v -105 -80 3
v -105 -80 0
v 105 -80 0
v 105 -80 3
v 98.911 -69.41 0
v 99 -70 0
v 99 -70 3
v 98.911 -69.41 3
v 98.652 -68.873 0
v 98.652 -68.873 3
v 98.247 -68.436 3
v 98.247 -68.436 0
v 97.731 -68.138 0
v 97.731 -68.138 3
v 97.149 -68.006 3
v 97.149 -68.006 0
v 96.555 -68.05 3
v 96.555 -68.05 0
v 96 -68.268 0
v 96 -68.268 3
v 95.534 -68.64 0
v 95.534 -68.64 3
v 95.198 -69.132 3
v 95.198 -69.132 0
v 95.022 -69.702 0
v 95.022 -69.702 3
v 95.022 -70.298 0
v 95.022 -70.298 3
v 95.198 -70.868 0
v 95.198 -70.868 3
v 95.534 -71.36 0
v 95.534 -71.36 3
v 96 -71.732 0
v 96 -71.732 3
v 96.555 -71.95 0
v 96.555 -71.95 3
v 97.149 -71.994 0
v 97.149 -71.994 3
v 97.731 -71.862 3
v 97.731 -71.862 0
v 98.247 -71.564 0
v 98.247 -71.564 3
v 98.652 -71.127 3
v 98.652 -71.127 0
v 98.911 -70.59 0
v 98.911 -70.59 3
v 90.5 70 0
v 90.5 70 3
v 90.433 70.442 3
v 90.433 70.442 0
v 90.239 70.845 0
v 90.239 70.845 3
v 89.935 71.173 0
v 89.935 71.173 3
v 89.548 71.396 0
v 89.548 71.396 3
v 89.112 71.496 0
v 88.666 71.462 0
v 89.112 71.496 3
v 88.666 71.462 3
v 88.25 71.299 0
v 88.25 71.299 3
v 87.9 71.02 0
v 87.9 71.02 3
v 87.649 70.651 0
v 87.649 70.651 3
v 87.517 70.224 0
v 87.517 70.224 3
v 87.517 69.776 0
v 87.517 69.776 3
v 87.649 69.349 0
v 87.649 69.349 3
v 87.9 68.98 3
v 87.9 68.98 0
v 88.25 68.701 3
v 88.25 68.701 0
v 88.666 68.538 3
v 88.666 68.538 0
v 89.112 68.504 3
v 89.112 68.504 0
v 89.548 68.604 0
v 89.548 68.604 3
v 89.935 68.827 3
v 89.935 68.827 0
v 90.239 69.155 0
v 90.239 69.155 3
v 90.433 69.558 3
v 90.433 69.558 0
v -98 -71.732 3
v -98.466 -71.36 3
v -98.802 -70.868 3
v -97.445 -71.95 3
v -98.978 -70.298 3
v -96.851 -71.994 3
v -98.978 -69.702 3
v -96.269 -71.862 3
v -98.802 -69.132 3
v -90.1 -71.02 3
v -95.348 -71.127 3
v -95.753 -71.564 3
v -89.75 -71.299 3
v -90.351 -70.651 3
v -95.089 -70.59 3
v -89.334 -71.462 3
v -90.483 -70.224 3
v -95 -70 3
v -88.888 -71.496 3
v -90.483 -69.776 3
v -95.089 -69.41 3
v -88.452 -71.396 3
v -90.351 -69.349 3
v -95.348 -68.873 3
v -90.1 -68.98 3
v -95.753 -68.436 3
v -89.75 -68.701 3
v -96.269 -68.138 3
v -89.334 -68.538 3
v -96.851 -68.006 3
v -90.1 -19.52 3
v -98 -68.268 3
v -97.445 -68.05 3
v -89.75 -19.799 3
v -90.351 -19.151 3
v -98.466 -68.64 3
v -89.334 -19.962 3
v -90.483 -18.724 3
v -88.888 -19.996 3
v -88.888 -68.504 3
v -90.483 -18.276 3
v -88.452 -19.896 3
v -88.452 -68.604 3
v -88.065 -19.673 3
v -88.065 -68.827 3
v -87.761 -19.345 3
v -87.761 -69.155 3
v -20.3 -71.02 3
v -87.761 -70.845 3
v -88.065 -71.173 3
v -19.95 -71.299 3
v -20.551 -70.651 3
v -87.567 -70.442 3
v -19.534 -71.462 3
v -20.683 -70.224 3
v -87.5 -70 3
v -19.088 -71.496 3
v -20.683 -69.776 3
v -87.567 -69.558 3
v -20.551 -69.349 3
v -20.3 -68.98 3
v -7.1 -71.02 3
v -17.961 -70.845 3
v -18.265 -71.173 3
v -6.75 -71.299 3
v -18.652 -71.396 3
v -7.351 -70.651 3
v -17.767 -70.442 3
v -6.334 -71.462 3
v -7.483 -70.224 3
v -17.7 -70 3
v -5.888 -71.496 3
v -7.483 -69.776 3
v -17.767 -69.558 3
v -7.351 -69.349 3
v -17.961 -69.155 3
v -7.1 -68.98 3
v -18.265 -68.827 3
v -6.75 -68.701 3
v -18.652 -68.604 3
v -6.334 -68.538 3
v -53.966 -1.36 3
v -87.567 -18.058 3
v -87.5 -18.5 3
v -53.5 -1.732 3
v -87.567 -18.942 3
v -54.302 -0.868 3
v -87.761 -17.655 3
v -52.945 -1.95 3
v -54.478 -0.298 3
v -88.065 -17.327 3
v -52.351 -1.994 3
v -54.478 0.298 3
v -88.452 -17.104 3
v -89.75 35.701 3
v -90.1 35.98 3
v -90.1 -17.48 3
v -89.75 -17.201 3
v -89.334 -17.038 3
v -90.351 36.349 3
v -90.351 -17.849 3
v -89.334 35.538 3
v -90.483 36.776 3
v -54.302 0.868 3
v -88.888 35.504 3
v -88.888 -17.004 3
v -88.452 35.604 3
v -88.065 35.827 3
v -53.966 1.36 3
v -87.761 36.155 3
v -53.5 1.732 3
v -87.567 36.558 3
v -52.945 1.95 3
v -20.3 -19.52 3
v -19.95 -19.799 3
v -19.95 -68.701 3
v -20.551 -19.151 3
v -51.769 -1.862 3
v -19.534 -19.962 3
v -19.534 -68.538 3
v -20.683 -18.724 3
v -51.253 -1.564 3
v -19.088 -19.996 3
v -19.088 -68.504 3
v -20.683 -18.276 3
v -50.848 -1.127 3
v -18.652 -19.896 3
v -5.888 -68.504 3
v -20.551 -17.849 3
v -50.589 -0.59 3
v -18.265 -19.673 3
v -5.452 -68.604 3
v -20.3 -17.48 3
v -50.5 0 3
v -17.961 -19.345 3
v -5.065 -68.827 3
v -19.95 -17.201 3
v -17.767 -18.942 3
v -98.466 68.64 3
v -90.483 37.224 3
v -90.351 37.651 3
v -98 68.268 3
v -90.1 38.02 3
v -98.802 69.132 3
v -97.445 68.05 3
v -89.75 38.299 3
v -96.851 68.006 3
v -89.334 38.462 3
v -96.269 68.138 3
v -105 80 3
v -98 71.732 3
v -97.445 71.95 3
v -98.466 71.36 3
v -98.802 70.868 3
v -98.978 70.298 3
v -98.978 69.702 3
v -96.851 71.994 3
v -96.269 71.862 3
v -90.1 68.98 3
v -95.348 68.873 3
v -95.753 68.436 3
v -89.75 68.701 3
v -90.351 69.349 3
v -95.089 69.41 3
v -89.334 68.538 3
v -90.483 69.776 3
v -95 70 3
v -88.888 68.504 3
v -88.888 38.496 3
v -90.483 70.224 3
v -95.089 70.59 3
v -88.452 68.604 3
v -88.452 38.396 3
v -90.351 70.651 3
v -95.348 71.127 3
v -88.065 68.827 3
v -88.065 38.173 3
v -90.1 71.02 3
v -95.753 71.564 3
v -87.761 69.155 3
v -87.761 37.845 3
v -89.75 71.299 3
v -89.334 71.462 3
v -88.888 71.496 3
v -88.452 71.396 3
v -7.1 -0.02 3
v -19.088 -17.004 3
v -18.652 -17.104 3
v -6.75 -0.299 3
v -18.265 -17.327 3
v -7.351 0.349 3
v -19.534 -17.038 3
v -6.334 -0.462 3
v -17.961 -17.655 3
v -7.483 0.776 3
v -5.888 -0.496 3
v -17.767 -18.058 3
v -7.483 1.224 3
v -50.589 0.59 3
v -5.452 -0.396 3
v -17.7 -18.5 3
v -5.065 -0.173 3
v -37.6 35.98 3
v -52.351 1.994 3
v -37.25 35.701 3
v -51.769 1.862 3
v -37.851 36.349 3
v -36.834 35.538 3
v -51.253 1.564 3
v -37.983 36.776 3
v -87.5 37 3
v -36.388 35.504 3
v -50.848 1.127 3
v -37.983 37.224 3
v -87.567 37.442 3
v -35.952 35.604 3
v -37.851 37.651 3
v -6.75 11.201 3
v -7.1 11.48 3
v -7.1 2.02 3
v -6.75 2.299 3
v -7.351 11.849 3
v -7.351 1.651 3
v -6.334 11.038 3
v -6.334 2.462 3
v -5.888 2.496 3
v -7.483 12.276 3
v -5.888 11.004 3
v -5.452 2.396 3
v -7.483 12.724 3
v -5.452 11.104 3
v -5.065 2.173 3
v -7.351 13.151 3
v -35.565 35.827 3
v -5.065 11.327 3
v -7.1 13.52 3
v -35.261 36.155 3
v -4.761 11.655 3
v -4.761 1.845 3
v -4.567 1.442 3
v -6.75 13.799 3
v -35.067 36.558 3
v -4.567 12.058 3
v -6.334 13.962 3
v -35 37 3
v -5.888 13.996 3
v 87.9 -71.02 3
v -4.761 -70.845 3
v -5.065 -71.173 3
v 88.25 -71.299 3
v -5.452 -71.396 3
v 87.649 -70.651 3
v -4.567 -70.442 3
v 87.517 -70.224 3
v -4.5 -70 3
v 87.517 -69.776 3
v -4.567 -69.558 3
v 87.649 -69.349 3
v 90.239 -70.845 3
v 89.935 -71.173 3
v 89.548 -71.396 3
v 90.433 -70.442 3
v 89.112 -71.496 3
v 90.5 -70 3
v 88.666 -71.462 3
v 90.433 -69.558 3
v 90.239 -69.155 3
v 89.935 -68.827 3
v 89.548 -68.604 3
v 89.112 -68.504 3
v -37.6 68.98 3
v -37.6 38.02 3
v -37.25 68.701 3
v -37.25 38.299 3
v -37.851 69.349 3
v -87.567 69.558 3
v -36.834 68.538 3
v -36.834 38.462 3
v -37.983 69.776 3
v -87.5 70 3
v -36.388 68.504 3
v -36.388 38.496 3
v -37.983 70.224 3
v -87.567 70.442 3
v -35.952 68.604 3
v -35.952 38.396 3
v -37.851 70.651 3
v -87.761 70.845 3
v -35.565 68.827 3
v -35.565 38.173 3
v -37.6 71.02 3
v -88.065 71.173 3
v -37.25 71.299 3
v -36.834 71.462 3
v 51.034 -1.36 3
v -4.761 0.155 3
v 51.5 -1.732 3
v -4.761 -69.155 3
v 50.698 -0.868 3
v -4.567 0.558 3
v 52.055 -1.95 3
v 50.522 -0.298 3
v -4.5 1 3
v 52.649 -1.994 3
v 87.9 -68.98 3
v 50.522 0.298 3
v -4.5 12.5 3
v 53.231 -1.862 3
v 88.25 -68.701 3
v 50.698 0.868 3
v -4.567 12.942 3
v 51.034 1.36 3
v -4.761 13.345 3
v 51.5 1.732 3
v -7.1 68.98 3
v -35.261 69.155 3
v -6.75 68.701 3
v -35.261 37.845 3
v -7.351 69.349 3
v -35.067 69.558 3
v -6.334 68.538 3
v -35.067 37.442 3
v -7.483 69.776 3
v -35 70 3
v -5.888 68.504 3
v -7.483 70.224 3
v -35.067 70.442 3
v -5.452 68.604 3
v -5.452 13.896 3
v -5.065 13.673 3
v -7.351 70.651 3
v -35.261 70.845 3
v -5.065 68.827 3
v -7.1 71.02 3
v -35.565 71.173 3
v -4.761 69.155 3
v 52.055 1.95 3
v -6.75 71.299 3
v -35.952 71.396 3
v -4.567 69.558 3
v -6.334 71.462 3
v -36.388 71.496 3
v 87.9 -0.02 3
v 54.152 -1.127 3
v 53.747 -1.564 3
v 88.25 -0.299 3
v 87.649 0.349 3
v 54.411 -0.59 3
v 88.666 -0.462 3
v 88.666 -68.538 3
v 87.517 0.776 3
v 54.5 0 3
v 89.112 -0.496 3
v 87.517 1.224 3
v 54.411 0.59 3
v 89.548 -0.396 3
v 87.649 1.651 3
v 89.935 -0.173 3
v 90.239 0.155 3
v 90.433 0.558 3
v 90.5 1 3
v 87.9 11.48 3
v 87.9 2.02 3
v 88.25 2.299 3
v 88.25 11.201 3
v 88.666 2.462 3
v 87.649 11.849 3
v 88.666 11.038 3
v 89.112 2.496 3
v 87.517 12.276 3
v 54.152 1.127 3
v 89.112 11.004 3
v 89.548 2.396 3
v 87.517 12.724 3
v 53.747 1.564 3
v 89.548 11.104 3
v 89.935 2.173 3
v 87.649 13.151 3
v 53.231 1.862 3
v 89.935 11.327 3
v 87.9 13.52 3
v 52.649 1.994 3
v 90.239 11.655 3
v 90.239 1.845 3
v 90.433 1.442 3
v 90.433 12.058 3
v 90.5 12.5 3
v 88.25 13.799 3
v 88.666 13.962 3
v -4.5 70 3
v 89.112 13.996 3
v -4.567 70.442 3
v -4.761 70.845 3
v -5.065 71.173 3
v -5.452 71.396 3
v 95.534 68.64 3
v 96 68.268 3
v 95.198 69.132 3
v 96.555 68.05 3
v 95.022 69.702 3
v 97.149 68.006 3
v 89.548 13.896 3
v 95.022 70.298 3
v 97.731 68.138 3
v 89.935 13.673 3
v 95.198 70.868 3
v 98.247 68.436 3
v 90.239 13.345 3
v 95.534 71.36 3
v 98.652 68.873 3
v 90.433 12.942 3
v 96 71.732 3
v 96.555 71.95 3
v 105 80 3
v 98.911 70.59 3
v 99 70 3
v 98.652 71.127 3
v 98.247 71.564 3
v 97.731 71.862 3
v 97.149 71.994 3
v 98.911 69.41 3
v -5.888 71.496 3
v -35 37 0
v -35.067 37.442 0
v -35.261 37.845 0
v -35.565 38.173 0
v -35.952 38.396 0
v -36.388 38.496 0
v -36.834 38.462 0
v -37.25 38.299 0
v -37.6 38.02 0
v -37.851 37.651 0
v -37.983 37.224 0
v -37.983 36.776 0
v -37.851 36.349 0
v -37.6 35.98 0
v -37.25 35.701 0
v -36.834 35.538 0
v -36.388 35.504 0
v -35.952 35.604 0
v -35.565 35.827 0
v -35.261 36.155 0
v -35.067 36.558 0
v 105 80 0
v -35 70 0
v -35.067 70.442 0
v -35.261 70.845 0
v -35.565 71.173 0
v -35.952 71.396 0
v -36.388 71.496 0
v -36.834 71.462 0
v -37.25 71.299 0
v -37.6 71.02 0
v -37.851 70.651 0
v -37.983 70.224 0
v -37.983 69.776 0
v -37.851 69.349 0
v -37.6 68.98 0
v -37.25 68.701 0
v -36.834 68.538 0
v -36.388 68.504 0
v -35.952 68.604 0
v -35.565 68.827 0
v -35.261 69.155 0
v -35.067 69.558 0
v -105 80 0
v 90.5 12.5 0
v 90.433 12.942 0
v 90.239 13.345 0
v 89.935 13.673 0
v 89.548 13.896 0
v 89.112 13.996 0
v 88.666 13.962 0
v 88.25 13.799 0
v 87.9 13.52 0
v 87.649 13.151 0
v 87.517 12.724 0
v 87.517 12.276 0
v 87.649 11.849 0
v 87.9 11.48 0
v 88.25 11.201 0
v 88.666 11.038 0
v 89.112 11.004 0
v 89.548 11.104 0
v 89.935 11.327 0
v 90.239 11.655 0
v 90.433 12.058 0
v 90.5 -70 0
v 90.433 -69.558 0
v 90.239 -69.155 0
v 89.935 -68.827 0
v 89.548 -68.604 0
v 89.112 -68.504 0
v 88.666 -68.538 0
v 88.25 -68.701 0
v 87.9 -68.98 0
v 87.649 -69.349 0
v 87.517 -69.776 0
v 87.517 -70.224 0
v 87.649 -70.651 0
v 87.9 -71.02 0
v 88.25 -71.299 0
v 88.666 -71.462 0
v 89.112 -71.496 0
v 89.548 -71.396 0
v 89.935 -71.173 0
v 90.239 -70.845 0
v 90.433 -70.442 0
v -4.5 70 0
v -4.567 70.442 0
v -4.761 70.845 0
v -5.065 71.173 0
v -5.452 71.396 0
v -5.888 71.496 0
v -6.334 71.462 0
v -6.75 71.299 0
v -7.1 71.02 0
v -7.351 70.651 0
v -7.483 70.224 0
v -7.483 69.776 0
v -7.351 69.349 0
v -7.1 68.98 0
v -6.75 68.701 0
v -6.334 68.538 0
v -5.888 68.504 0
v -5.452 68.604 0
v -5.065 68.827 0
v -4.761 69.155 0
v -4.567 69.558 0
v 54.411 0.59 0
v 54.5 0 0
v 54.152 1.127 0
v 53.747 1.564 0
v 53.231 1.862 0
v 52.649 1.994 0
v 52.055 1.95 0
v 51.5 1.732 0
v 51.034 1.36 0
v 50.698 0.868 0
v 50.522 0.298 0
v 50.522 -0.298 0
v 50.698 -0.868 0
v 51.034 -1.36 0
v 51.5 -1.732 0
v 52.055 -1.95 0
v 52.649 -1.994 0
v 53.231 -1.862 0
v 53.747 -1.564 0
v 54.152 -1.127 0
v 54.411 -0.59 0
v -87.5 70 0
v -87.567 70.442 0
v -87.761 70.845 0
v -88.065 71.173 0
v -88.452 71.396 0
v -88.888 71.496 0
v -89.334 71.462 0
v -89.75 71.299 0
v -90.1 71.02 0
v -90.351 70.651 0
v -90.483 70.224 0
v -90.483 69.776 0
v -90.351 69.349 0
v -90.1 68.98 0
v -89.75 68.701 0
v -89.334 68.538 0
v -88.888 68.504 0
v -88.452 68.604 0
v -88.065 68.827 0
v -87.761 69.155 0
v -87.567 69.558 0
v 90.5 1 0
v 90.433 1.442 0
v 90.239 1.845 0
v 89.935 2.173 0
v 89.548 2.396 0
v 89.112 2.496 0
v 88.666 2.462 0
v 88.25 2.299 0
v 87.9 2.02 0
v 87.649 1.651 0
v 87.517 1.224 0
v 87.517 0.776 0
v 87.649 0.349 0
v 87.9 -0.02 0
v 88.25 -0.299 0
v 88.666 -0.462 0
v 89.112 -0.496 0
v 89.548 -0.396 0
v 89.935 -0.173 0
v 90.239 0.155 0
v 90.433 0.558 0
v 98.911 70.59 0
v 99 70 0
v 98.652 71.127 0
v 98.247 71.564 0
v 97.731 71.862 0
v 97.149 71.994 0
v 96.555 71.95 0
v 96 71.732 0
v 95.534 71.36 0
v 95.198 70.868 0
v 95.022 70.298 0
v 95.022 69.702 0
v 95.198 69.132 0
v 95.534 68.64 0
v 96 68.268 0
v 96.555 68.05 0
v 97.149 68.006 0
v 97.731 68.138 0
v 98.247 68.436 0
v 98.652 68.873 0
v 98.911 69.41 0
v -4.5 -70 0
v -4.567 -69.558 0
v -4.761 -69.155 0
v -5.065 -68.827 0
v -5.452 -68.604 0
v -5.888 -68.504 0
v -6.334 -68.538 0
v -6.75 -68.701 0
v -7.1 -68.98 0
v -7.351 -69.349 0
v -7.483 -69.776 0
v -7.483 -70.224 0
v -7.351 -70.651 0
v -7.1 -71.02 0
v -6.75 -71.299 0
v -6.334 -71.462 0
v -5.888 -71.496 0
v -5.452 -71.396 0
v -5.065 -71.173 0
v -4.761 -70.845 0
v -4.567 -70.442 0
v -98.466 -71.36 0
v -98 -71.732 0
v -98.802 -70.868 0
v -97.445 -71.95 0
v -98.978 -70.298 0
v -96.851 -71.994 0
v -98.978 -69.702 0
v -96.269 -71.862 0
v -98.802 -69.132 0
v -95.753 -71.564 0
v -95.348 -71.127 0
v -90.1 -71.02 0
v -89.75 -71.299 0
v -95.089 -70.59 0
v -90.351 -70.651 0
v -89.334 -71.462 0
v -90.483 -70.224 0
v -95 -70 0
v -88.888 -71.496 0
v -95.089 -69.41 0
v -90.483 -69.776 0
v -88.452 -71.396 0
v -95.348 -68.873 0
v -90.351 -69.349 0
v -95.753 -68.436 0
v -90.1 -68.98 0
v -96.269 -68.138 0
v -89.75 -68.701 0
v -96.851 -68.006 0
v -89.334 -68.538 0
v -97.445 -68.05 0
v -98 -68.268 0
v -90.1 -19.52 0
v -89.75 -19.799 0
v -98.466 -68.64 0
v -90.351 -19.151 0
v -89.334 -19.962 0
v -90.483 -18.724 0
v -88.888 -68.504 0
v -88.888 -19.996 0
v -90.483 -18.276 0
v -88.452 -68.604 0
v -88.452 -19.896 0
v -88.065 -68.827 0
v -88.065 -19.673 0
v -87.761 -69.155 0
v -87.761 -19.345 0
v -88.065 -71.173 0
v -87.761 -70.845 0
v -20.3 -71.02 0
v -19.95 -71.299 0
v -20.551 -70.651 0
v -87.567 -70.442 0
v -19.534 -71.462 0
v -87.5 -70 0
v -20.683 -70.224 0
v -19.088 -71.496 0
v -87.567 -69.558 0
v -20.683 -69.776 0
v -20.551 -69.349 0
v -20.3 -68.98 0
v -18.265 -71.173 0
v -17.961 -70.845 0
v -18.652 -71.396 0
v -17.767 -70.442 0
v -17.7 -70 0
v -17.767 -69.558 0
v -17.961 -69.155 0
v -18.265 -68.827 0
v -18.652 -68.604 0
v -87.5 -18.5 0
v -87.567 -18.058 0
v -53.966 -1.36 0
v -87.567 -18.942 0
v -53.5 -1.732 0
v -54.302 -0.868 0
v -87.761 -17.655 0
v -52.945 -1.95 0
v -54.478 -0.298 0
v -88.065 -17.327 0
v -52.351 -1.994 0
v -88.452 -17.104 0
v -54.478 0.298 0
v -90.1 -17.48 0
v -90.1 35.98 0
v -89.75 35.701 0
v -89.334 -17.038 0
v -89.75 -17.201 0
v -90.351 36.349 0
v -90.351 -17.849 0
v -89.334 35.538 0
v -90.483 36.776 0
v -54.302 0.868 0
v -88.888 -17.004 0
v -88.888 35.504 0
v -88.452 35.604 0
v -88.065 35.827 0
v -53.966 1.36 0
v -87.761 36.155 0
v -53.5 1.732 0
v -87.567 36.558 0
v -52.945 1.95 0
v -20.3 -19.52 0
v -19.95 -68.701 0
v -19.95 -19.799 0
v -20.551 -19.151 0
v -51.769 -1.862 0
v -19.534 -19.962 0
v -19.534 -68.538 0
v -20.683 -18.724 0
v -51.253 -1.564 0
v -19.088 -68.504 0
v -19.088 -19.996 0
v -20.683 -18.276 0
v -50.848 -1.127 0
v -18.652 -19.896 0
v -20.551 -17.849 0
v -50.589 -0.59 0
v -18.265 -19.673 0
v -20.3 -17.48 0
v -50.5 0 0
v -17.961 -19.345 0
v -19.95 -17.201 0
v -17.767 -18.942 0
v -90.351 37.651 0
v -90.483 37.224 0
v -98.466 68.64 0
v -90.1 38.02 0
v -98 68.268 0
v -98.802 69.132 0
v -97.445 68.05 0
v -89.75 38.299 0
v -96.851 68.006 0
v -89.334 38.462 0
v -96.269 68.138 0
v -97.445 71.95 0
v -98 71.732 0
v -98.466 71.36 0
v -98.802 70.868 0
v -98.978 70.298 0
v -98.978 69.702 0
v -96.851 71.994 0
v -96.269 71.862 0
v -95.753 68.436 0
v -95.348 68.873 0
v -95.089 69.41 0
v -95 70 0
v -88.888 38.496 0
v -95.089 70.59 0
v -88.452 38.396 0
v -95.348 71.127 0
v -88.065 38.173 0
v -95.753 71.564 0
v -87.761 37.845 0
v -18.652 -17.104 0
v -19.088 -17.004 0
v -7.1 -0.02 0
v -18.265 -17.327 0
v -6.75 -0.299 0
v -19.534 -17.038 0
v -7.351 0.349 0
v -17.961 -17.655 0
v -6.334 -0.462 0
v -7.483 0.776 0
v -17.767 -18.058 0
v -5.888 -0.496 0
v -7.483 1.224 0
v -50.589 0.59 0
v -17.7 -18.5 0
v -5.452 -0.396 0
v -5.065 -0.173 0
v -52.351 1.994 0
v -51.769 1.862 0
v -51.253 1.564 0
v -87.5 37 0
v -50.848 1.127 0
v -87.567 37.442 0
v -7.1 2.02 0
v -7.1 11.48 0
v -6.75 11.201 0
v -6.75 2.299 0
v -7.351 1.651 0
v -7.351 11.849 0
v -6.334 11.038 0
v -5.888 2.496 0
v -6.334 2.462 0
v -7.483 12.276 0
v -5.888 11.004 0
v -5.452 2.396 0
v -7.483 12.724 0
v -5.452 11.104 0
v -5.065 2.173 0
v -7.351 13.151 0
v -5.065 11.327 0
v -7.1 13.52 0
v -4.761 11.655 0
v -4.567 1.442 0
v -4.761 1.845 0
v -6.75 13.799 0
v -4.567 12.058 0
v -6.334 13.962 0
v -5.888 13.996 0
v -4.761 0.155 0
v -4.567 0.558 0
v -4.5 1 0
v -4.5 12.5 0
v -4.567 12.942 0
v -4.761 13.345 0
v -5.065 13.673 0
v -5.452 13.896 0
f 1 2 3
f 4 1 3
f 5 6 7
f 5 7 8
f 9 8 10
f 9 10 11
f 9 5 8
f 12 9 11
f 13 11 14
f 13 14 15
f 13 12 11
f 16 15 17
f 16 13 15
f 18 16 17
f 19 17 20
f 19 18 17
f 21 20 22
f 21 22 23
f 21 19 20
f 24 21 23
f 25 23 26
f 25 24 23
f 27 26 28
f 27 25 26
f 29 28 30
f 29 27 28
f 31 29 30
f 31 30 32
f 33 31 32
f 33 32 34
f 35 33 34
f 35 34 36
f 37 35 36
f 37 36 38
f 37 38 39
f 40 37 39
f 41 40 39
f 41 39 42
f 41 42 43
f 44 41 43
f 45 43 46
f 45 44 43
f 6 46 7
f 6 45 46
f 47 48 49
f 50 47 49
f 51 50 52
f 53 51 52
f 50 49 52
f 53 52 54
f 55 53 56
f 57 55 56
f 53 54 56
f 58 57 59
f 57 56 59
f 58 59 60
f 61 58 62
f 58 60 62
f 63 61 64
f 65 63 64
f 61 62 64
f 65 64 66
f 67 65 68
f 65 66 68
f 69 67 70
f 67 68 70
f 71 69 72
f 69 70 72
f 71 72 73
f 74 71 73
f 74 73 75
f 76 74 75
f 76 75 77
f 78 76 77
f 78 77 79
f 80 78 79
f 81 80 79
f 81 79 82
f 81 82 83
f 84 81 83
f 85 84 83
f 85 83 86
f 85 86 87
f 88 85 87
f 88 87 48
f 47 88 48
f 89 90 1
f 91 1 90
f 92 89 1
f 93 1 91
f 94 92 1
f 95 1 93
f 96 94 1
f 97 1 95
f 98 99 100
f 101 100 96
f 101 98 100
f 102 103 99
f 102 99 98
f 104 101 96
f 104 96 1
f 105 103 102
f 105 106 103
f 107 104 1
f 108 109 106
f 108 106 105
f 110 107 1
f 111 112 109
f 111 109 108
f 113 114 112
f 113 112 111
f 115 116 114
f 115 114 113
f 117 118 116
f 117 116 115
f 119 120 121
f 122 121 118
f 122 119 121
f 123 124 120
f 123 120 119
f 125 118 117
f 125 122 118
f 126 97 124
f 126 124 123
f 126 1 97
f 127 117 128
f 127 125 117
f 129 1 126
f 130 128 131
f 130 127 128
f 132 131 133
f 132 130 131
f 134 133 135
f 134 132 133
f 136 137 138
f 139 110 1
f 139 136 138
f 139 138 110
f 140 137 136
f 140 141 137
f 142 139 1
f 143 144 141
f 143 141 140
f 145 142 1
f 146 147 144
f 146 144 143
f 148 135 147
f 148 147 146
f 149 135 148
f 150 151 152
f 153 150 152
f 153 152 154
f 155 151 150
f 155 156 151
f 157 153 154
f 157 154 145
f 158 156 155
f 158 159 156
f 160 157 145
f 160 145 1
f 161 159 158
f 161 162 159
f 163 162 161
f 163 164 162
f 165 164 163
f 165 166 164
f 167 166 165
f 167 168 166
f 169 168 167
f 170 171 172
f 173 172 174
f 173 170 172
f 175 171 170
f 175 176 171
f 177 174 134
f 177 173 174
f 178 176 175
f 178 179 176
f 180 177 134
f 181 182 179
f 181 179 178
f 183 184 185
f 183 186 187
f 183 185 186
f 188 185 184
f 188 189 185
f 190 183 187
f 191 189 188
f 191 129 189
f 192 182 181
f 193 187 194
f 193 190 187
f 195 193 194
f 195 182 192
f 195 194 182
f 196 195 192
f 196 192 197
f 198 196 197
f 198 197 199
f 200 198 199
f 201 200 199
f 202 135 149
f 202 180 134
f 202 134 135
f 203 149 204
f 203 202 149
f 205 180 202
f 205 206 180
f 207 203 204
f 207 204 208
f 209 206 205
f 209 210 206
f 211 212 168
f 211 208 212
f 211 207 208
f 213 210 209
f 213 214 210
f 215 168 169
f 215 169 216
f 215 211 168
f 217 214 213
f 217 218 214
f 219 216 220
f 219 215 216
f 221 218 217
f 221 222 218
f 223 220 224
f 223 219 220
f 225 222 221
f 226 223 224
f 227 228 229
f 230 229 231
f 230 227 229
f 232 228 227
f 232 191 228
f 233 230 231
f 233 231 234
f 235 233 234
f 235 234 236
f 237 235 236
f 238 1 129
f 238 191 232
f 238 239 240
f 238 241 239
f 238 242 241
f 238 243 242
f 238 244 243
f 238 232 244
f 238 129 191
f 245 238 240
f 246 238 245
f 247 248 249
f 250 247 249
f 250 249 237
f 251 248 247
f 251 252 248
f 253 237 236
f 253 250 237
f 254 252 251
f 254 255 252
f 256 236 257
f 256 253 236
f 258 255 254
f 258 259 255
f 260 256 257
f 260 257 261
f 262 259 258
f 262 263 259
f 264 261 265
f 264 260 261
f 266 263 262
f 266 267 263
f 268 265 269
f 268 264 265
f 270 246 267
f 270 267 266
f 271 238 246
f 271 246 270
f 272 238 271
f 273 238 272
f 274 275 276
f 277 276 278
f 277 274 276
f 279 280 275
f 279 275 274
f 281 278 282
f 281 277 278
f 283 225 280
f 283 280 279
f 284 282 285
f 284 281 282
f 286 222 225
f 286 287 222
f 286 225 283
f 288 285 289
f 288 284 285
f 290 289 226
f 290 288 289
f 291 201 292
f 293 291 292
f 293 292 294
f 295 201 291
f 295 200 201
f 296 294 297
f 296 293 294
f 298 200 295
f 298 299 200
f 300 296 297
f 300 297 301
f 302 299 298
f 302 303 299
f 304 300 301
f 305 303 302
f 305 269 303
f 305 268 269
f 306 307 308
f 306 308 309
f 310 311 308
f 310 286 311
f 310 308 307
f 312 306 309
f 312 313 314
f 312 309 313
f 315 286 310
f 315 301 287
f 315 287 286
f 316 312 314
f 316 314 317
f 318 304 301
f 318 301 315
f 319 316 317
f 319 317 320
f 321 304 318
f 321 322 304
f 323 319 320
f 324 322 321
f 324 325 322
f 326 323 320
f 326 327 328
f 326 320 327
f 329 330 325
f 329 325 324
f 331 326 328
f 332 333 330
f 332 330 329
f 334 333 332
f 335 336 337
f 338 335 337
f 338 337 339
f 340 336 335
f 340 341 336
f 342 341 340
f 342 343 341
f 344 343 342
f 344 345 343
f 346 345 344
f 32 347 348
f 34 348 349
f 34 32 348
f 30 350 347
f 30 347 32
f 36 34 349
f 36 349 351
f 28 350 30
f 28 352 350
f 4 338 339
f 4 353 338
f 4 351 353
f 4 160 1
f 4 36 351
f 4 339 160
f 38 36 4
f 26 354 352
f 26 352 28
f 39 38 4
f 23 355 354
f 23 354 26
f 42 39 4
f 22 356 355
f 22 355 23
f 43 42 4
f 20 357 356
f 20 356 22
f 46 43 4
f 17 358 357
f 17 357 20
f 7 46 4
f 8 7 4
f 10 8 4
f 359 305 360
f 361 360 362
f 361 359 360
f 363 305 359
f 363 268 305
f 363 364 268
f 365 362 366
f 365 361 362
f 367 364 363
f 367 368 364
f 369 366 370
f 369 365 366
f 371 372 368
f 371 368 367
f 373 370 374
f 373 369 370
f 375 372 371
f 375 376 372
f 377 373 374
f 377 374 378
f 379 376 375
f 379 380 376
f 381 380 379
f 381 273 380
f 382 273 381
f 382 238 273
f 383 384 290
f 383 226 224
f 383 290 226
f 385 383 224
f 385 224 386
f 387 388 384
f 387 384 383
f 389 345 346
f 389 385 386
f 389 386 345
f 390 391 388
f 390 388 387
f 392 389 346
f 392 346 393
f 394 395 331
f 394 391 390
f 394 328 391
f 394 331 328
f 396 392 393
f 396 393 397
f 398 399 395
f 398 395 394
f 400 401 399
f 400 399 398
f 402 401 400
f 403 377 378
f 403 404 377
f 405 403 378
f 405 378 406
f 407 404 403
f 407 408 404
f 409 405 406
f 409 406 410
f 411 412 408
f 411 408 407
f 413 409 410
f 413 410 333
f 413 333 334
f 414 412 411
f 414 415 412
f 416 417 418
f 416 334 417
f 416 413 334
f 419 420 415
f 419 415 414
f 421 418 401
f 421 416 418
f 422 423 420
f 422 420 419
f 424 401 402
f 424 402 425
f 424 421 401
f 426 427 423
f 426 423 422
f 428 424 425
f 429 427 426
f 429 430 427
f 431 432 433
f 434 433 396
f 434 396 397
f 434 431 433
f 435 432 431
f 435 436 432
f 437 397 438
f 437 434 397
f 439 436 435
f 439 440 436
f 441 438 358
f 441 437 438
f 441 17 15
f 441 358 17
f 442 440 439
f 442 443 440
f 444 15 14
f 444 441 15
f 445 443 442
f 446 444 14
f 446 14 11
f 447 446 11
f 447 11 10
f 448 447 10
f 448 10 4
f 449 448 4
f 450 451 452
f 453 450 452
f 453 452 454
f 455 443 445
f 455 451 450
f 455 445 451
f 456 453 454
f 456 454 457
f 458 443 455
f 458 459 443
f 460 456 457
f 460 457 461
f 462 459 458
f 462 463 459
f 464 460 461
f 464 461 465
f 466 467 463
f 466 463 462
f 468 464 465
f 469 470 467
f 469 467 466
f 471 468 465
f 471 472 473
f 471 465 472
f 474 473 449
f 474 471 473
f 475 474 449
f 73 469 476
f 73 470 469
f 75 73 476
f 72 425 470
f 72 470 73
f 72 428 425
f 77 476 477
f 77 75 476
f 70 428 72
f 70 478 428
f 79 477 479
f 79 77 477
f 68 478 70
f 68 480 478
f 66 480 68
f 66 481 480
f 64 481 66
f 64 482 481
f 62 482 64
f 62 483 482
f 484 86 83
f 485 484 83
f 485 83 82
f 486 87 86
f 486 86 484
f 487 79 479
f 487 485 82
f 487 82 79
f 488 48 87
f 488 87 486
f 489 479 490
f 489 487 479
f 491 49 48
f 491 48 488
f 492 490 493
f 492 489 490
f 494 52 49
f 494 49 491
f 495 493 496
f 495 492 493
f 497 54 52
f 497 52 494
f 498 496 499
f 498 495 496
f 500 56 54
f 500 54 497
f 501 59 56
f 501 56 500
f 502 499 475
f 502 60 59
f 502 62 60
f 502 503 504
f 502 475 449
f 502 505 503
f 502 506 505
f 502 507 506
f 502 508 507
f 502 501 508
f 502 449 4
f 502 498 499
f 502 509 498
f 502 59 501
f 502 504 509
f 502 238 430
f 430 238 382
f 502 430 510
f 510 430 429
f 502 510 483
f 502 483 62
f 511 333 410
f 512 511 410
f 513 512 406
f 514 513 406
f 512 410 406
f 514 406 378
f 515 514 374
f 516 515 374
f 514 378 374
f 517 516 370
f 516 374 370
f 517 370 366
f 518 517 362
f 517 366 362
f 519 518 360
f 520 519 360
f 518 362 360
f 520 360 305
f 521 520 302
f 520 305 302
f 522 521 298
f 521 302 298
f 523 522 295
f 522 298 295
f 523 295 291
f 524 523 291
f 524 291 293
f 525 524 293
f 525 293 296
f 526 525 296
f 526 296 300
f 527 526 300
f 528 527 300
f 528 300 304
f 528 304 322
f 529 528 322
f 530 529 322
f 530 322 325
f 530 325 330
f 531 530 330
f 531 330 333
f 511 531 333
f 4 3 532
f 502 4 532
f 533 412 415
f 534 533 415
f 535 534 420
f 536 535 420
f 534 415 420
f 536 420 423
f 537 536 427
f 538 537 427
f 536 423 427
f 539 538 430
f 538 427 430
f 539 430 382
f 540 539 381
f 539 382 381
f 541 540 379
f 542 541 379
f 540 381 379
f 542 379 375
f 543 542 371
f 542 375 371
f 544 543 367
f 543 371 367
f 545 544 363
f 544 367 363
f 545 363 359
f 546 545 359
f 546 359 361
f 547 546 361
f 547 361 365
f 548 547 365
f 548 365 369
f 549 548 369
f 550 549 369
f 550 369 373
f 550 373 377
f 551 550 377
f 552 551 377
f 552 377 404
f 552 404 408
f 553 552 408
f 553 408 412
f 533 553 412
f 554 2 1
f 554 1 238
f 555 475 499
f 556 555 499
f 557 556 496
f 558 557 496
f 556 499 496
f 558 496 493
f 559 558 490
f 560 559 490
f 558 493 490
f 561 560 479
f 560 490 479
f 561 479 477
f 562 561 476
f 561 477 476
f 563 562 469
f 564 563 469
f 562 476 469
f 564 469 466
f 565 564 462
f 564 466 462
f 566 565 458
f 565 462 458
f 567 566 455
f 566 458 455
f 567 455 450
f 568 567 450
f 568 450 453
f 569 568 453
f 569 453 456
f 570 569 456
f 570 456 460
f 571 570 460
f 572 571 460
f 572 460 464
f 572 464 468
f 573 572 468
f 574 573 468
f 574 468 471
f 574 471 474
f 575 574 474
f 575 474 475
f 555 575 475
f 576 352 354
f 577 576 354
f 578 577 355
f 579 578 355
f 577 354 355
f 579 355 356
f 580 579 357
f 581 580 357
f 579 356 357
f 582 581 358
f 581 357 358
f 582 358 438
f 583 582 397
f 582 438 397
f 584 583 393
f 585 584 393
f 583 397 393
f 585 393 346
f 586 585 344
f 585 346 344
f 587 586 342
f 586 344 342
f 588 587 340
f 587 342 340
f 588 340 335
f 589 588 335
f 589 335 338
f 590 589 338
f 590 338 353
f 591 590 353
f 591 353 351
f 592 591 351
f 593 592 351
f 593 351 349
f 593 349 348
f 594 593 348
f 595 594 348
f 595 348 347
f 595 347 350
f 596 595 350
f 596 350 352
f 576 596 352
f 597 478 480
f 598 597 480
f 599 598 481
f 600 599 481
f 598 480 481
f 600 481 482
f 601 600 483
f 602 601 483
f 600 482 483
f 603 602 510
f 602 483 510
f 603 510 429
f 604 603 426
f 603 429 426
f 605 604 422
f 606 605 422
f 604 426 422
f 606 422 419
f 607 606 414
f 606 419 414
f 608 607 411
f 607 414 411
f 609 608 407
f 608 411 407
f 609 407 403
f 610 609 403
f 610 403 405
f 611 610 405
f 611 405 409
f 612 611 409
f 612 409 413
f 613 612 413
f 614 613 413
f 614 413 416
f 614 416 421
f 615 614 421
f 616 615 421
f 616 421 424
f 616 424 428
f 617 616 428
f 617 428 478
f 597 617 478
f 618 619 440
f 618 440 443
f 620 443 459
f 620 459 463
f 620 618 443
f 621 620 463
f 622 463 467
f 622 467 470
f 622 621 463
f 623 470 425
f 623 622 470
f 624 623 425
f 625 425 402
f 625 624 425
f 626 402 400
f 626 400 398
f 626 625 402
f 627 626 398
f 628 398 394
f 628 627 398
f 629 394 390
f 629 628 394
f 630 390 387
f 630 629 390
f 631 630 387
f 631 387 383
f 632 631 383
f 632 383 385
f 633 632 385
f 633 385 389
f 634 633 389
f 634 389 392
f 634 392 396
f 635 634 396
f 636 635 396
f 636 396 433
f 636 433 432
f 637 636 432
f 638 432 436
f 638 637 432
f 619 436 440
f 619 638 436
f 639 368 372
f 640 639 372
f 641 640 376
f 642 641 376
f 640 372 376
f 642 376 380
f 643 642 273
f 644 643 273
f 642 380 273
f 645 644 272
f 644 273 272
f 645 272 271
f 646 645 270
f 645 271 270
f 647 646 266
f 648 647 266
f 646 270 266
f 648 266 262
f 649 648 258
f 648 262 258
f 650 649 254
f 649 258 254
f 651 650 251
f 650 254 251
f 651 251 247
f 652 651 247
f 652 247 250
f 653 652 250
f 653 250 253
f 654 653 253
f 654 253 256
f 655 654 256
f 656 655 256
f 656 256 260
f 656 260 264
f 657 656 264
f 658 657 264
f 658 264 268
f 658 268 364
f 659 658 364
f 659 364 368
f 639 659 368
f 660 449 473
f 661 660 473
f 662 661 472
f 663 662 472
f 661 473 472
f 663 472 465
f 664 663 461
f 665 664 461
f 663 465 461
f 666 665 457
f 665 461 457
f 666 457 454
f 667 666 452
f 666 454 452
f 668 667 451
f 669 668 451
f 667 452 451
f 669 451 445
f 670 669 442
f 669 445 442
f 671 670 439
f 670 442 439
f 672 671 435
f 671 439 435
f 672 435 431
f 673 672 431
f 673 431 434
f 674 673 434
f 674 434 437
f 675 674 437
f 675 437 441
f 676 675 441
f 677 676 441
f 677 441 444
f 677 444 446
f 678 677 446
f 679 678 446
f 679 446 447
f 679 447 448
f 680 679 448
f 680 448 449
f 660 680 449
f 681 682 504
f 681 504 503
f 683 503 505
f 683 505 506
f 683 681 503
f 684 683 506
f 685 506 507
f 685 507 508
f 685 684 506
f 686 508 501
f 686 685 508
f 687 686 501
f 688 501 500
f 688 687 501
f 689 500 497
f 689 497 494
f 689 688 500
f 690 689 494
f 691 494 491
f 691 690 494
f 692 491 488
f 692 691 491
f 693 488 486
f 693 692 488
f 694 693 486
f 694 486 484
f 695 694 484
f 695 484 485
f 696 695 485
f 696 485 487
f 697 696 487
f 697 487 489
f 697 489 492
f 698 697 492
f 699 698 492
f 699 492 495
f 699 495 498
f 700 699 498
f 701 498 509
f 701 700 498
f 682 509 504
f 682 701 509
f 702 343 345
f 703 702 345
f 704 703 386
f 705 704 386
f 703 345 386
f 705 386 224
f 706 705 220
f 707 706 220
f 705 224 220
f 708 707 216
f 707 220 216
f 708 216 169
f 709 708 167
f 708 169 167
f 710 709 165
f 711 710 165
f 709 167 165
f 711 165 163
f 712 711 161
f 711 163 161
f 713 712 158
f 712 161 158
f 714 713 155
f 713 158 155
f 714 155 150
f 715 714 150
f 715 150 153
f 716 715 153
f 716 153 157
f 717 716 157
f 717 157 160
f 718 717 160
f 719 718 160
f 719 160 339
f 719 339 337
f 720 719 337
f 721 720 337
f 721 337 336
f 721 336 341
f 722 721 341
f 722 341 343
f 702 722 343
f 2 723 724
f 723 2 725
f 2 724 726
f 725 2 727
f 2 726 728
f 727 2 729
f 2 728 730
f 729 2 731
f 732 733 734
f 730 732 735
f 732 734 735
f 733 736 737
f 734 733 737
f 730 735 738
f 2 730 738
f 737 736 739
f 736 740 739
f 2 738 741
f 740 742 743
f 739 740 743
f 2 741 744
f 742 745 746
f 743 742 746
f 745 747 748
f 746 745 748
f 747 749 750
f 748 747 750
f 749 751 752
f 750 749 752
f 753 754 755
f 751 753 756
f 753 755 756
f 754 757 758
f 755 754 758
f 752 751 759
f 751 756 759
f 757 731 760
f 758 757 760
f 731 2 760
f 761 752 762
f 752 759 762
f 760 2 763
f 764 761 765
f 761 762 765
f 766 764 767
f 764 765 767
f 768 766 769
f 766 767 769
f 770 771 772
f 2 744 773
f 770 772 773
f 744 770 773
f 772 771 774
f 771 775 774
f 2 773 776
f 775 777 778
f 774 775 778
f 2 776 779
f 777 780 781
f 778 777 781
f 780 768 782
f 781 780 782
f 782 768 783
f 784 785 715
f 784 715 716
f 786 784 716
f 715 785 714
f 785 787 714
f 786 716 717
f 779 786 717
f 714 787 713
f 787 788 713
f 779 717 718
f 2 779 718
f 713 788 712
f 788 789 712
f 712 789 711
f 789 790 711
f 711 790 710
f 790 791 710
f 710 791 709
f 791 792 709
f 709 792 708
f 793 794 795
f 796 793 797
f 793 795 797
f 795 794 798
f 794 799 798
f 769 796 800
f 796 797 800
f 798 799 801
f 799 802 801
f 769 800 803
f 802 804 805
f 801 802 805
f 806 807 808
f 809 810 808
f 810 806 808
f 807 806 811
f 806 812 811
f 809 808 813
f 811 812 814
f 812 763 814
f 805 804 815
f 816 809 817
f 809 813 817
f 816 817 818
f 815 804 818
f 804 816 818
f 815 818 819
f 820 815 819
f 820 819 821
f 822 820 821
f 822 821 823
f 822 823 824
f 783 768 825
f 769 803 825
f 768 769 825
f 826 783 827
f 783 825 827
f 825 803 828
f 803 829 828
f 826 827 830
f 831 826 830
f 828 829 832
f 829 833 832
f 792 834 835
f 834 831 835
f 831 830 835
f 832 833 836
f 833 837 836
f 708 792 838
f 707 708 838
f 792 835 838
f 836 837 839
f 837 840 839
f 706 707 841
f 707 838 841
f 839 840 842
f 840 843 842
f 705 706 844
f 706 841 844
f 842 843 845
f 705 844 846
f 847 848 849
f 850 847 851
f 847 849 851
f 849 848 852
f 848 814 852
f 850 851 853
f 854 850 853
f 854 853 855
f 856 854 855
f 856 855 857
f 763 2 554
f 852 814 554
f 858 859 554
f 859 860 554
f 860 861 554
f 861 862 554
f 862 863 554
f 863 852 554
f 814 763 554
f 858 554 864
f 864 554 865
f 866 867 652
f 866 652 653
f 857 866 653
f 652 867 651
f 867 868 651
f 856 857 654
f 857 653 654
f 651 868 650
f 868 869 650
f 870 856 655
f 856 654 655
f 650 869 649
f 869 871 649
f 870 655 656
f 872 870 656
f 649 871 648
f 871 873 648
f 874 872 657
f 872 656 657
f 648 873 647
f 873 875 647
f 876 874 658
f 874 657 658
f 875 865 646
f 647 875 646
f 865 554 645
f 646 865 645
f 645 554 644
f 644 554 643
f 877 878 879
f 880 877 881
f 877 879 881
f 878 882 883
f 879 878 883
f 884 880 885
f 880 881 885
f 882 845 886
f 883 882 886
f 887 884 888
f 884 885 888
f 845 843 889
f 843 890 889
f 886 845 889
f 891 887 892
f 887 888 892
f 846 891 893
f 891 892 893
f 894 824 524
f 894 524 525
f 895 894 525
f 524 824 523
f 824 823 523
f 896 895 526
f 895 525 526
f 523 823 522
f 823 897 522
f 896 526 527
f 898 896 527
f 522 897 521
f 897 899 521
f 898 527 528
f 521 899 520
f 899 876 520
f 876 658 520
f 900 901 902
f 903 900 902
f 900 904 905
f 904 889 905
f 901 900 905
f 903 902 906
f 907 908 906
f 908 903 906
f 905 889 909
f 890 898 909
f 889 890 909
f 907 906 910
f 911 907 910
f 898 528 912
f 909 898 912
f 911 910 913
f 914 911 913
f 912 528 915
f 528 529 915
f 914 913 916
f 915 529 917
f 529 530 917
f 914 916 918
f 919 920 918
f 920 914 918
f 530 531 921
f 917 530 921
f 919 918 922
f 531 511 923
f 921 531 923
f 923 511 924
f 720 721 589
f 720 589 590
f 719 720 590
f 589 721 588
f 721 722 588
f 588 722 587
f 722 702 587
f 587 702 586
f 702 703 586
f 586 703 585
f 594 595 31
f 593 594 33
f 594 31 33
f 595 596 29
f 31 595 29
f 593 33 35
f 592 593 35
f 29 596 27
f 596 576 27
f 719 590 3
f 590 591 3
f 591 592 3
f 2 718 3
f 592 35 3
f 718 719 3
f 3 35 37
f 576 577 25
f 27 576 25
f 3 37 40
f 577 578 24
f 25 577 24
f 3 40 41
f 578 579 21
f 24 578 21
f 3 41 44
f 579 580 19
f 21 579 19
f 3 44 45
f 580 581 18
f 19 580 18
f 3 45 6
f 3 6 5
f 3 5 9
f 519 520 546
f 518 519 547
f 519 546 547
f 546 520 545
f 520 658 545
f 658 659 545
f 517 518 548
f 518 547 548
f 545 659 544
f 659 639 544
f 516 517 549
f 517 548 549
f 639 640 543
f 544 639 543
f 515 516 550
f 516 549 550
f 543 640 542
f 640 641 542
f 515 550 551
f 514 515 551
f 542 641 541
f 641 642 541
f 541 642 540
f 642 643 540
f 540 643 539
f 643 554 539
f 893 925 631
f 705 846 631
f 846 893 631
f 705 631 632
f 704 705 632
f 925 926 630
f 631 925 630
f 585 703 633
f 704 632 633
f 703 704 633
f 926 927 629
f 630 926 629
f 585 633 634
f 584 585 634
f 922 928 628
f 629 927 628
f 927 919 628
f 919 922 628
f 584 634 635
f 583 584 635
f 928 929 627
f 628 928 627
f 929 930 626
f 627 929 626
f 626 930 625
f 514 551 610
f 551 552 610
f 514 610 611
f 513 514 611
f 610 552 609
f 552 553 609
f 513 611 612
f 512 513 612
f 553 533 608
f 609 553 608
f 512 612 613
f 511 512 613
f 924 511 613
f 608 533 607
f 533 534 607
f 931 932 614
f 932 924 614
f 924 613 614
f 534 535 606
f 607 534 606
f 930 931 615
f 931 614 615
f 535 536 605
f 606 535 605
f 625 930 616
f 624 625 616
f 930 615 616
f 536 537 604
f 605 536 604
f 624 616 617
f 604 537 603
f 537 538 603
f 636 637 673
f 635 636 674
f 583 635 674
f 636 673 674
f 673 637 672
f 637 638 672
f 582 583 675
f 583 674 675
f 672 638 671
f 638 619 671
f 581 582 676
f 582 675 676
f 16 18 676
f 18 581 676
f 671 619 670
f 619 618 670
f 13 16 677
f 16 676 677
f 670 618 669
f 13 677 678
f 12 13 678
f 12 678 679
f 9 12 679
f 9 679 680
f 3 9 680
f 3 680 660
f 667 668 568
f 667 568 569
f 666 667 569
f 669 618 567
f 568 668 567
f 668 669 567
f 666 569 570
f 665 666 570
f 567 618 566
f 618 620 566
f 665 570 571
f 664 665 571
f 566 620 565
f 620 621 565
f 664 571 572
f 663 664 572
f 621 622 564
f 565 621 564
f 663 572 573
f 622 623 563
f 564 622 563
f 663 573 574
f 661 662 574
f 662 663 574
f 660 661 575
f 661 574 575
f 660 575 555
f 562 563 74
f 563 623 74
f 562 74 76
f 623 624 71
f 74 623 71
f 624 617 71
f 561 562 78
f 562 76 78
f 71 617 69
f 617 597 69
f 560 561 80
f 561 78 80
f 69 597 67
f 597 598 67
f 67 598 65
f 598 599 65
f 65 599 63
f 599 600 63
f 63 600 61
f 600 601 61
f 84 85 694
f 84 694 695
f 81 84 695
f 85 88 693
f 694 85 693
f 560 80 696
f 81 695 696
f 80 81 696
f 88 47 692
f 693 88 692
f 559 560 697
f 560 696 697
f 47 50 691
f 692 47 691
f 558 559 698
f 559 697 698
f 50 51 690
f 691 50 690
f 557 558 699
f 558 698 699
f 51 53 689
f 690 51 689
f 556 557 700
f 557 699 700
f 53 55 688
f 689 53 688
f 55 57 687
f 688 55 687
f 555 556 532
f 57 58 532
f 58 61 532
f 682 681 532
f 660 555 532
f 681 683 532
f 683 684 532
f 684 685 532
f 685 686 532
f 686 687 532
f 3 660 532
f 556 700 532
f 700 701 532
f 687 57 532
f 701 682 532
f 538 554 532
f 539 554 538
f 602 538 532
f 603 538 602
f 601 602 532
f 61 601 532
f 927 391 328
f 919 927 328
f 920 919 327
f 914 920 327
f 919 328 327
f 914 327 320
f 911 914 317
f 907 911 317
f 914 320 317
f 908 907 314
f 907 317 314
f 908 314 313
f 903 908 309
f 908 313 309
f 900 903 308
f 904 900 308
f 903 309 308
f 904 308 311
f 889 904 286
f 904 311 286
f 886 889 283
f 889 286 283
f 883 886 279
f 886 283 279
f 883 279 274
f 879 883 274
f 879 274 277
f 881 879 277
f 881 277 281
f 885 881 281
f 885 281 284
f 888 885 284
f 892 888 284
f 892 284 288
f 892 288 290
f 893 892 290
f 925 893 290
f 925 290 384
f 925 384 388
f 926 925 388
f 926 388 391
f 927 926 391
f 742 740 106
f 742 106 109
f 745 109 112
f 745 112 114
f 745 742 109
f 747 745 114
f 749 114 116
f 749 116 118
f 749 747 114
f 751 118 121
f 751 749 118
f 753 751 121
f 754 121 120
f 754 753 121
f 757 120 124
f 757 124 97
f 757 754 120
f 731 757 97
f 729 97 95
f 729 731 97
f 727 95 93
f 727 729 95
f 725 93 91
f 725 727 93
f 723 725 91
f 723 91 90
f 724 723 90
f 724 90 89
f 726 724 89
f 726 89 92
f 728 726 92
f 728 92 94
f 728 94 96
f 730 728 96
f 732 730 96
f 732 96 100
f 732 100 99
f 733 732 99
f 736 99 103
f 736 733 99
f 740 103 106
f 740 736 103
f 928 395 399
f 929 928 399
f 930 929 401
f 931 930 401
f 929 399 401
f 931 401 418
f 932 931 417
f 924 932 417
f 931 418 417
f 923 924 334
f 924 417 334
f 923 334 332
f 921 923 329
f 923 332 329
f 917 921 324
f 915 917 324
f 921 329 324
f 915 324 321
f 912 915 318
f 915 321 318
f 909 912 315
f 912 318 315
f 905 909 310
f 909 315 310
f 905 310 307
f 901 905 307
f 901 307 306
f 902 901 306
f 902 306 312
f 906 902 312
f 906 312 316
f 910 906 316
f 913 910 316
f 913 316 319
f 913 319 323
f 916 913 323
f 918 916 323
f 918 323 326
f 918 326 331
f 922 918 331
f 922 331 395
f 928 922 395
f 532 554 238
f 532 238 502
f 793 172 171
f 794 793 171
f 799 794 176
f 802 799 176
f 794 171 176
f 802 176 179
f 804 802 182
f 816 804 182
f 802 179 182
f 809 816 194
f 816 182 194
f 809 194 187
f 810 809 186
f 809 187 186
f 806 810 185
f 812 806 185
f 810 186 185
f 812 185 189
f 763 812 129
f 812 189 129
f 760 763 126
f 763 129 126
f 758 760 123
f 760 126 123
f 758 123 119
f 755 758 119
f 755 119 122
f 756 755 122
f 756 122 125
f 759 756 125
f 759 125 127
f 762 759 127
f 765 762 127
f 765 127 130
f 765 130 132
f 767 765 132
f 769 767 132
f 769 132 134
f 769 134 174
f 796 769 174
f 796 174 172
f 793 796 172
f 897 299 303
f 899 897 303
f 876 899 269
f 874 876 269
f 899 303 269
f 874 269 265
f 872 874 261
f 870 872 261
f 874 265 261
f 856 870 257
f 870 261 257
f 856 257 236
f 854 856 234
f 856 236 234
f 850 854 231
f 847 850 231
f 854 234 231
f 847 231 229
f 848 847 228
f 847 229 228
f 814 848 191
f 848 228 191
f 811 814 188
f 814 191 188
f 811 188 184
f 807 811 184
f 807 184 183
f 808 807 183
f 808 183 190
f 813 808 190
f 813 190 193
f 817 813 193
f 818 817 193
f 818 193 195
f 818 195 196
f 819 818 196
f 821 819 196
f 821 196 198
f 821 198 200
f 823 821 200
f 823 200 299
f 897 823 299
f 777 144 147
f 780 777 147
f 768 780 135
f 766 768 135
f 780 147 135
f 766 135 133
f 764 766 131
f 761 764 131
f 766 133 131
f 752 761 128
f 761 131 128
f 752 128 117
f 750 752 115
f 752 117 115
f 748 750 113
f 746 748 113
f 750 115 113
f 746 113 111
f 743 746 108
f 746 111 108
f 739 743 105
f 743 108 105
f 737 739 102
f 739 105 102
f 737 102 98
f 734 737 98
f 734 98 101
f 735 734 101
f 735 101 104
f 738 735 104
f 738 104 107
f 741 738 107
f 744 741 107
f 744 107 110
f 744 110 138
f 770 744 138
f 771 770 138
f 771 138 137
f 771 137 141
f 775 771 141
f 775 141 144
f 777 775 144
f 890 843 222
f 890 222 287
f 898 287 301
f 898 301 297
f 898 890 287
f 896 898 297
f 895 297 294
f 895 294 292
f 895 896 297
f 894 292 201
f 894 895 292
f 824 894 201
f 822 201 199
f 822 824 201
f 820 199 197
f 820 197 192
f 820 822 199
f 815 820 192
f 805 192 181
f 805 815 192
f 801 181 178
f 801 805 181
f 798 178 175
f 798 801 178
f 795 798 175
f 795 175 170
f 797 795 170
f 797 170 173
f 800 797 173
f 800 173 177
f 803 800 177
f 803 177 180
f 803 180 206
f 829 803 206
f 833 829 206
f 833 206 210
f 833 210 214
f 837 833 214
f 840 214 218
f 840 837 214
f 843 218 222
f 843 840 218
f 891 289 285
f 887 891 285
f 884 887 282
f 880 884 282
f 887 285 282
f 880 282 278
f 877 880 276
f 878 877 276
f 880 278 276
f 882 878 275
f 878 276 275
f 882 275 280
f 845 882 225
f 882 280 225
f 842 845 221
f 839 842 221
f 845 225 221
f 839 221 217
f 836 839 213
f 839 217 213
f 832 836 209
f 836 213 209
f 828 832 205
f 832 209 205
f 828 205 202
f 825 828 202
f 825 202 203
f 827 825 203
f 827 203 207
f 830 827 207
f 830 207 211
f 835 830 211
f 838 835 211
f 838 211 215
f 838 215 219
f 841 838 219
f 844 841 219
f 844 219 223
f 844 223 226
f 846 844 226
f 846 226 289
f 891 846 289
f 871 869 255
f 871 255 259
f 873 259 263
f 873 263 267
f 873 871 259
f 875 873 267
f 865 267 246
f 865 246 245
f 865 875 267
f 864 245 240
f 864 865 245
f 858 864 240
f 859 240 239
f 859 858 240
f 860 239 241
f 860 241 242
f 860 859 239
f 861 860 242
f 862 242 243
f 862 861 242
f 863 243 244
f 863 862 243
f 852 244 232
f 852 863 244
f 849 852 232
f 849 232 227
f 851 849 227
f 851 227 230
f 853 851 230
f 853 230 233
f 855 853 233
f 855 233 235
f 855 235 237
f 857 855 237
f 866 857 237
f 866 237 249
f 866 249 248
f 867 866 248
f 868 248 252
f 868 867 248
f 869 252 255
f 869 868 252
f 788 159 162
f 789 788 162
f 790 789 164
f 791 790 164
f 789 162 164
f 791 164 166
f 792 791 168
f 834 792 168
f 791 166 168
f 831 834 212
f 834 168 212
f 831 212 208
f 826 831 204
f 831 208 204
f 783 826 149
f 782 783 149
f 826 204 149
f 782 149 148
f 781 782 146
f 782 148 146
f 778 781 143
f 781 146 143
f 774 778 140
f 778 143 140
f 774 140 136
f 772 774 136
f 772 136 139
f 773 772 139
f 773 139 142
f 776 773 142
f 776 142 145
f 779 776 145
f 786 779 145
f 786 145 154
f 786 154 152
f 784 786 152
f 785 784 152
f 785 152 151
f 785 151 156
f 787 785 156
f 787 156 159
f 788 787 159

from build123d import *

# Parameters (mm, degrees)
SKETCH1_W           = 210
SKETCH1_H           = 160
SKETCH1_R           = 2
BOSS_EXTRUDE1_DEPTH = 3
SKETCH2_R           = 1.5
LVPCB_HOLE_DEPTH    = 20
SKETCH4_R           = 1.5
SDC_HOLE_DEPTH      = 10
SKETCH3_R           = 1.5
TSAL_LV_HOLE_DEPTH  = 10
SKETCH5_R           = 1.5
BSPD_HOLE_DEPTH     = 10


with BuildPart() as part:
    # Sketch1 → Boss-Extrude1 (new body)
    with BuildSketch(Plane.XY):
        Rectangle(SKETCH1_W, SKETCH1_H)
        with Locations((-97, 70)):
            Circle(SKETCH1_R, mode=Mode.SUBTRACT)
        with Locations((-97, -70)):
            Circle(SKETCH1_R, mode=Mode.SUBTRACT)
        with Locations((97, -70)):
            Circle(SKETCH1_R, mode=Mode.SUBTRACT)
        with Locations((97, 70)):
            Circle(SKETCH1_R, mode=Mode.SUBTRACT)
        with Locations((-52.5, 0)):
            Circle(SKETCH1_R, mode=Mode.SUBTRACT)
        with Locations((52.5, 0)):
            Circle(SKETCH1_R, mode=Mode.SUBTRACT)
    extrude(amount=BOSS_EXTRUDE1_DEPTH)

    # Sketch2 → LVPCB Hole (cut)
    with BuildSketch(Plane.XY.offset(3)):
        with Locations((-6, 70)):
            Circle(SKETCH2_R)
        with Locations((89, 70)):
            Circle(SKETCH2_R)
        with Locations((-6, 12.5)):
            Circle(SKETCH2_R)
        with Locations((89, 12.5)):
            Circle(SKETCH2_R)
    extrude(amount=-LVPCB_HOLE_DEPTH, mode=Mode.SUBTRACT)

    # Sketch4 → SDC Hole (cut)
    with BuildSketch(Plane.XY.offset(3)):
        with Locations((-6, 1)):
            Circle(SKETCH4_R)
        with Locations((89, 1)):
            Circle(SKETCH4_R)
        with Locations((-6, -70)):
            Circle(SKETCH4_R)
        with Locations((89, -70)):
            Circle(SKETCH4_R)
    extrude(amount=-SDC_HOLE_DEPTH, mode=Mode.SUBTRACT)

    # Sketch3 → TSAL LV Hole (cut)
    with BuildSketch(Plane.XY.offset(3)):
        with Locations((-89, -18.5)):
            Circle(SKETCH3_R)
        with Locations((-19.2, -18.5)):
            Circle(SKETCH3_R)
        with Locations((-89, -70)):
            Circle(SKETCH3_R)
        with Locations((-19.2, -70)):
            Circle(SKETCH3_R)
    extrude(amount=-TSAL_LV_HOLE_DEPTH, mode=Mode.SUBTRACT)

    # Sketch5 → BSPD Hole (cut)
    with BuildSketch(Plane.XY.offset(3)):
        with Locations((-89, 70)):
            Circle(SKETCH5_R)
        with Locations((-36.5, 70)):
            Circle(SKETCH5_R)
        with Locations((-89, 37)):
            Circle(SKETCH5_R)
        with Locations((-36.5, 37)):
            Circle(SKETCH5_R)
    extrude(amount=-BSPD_HOLE_DEPTH, mode=Mode.SUBTRACT)


solid = part.part
